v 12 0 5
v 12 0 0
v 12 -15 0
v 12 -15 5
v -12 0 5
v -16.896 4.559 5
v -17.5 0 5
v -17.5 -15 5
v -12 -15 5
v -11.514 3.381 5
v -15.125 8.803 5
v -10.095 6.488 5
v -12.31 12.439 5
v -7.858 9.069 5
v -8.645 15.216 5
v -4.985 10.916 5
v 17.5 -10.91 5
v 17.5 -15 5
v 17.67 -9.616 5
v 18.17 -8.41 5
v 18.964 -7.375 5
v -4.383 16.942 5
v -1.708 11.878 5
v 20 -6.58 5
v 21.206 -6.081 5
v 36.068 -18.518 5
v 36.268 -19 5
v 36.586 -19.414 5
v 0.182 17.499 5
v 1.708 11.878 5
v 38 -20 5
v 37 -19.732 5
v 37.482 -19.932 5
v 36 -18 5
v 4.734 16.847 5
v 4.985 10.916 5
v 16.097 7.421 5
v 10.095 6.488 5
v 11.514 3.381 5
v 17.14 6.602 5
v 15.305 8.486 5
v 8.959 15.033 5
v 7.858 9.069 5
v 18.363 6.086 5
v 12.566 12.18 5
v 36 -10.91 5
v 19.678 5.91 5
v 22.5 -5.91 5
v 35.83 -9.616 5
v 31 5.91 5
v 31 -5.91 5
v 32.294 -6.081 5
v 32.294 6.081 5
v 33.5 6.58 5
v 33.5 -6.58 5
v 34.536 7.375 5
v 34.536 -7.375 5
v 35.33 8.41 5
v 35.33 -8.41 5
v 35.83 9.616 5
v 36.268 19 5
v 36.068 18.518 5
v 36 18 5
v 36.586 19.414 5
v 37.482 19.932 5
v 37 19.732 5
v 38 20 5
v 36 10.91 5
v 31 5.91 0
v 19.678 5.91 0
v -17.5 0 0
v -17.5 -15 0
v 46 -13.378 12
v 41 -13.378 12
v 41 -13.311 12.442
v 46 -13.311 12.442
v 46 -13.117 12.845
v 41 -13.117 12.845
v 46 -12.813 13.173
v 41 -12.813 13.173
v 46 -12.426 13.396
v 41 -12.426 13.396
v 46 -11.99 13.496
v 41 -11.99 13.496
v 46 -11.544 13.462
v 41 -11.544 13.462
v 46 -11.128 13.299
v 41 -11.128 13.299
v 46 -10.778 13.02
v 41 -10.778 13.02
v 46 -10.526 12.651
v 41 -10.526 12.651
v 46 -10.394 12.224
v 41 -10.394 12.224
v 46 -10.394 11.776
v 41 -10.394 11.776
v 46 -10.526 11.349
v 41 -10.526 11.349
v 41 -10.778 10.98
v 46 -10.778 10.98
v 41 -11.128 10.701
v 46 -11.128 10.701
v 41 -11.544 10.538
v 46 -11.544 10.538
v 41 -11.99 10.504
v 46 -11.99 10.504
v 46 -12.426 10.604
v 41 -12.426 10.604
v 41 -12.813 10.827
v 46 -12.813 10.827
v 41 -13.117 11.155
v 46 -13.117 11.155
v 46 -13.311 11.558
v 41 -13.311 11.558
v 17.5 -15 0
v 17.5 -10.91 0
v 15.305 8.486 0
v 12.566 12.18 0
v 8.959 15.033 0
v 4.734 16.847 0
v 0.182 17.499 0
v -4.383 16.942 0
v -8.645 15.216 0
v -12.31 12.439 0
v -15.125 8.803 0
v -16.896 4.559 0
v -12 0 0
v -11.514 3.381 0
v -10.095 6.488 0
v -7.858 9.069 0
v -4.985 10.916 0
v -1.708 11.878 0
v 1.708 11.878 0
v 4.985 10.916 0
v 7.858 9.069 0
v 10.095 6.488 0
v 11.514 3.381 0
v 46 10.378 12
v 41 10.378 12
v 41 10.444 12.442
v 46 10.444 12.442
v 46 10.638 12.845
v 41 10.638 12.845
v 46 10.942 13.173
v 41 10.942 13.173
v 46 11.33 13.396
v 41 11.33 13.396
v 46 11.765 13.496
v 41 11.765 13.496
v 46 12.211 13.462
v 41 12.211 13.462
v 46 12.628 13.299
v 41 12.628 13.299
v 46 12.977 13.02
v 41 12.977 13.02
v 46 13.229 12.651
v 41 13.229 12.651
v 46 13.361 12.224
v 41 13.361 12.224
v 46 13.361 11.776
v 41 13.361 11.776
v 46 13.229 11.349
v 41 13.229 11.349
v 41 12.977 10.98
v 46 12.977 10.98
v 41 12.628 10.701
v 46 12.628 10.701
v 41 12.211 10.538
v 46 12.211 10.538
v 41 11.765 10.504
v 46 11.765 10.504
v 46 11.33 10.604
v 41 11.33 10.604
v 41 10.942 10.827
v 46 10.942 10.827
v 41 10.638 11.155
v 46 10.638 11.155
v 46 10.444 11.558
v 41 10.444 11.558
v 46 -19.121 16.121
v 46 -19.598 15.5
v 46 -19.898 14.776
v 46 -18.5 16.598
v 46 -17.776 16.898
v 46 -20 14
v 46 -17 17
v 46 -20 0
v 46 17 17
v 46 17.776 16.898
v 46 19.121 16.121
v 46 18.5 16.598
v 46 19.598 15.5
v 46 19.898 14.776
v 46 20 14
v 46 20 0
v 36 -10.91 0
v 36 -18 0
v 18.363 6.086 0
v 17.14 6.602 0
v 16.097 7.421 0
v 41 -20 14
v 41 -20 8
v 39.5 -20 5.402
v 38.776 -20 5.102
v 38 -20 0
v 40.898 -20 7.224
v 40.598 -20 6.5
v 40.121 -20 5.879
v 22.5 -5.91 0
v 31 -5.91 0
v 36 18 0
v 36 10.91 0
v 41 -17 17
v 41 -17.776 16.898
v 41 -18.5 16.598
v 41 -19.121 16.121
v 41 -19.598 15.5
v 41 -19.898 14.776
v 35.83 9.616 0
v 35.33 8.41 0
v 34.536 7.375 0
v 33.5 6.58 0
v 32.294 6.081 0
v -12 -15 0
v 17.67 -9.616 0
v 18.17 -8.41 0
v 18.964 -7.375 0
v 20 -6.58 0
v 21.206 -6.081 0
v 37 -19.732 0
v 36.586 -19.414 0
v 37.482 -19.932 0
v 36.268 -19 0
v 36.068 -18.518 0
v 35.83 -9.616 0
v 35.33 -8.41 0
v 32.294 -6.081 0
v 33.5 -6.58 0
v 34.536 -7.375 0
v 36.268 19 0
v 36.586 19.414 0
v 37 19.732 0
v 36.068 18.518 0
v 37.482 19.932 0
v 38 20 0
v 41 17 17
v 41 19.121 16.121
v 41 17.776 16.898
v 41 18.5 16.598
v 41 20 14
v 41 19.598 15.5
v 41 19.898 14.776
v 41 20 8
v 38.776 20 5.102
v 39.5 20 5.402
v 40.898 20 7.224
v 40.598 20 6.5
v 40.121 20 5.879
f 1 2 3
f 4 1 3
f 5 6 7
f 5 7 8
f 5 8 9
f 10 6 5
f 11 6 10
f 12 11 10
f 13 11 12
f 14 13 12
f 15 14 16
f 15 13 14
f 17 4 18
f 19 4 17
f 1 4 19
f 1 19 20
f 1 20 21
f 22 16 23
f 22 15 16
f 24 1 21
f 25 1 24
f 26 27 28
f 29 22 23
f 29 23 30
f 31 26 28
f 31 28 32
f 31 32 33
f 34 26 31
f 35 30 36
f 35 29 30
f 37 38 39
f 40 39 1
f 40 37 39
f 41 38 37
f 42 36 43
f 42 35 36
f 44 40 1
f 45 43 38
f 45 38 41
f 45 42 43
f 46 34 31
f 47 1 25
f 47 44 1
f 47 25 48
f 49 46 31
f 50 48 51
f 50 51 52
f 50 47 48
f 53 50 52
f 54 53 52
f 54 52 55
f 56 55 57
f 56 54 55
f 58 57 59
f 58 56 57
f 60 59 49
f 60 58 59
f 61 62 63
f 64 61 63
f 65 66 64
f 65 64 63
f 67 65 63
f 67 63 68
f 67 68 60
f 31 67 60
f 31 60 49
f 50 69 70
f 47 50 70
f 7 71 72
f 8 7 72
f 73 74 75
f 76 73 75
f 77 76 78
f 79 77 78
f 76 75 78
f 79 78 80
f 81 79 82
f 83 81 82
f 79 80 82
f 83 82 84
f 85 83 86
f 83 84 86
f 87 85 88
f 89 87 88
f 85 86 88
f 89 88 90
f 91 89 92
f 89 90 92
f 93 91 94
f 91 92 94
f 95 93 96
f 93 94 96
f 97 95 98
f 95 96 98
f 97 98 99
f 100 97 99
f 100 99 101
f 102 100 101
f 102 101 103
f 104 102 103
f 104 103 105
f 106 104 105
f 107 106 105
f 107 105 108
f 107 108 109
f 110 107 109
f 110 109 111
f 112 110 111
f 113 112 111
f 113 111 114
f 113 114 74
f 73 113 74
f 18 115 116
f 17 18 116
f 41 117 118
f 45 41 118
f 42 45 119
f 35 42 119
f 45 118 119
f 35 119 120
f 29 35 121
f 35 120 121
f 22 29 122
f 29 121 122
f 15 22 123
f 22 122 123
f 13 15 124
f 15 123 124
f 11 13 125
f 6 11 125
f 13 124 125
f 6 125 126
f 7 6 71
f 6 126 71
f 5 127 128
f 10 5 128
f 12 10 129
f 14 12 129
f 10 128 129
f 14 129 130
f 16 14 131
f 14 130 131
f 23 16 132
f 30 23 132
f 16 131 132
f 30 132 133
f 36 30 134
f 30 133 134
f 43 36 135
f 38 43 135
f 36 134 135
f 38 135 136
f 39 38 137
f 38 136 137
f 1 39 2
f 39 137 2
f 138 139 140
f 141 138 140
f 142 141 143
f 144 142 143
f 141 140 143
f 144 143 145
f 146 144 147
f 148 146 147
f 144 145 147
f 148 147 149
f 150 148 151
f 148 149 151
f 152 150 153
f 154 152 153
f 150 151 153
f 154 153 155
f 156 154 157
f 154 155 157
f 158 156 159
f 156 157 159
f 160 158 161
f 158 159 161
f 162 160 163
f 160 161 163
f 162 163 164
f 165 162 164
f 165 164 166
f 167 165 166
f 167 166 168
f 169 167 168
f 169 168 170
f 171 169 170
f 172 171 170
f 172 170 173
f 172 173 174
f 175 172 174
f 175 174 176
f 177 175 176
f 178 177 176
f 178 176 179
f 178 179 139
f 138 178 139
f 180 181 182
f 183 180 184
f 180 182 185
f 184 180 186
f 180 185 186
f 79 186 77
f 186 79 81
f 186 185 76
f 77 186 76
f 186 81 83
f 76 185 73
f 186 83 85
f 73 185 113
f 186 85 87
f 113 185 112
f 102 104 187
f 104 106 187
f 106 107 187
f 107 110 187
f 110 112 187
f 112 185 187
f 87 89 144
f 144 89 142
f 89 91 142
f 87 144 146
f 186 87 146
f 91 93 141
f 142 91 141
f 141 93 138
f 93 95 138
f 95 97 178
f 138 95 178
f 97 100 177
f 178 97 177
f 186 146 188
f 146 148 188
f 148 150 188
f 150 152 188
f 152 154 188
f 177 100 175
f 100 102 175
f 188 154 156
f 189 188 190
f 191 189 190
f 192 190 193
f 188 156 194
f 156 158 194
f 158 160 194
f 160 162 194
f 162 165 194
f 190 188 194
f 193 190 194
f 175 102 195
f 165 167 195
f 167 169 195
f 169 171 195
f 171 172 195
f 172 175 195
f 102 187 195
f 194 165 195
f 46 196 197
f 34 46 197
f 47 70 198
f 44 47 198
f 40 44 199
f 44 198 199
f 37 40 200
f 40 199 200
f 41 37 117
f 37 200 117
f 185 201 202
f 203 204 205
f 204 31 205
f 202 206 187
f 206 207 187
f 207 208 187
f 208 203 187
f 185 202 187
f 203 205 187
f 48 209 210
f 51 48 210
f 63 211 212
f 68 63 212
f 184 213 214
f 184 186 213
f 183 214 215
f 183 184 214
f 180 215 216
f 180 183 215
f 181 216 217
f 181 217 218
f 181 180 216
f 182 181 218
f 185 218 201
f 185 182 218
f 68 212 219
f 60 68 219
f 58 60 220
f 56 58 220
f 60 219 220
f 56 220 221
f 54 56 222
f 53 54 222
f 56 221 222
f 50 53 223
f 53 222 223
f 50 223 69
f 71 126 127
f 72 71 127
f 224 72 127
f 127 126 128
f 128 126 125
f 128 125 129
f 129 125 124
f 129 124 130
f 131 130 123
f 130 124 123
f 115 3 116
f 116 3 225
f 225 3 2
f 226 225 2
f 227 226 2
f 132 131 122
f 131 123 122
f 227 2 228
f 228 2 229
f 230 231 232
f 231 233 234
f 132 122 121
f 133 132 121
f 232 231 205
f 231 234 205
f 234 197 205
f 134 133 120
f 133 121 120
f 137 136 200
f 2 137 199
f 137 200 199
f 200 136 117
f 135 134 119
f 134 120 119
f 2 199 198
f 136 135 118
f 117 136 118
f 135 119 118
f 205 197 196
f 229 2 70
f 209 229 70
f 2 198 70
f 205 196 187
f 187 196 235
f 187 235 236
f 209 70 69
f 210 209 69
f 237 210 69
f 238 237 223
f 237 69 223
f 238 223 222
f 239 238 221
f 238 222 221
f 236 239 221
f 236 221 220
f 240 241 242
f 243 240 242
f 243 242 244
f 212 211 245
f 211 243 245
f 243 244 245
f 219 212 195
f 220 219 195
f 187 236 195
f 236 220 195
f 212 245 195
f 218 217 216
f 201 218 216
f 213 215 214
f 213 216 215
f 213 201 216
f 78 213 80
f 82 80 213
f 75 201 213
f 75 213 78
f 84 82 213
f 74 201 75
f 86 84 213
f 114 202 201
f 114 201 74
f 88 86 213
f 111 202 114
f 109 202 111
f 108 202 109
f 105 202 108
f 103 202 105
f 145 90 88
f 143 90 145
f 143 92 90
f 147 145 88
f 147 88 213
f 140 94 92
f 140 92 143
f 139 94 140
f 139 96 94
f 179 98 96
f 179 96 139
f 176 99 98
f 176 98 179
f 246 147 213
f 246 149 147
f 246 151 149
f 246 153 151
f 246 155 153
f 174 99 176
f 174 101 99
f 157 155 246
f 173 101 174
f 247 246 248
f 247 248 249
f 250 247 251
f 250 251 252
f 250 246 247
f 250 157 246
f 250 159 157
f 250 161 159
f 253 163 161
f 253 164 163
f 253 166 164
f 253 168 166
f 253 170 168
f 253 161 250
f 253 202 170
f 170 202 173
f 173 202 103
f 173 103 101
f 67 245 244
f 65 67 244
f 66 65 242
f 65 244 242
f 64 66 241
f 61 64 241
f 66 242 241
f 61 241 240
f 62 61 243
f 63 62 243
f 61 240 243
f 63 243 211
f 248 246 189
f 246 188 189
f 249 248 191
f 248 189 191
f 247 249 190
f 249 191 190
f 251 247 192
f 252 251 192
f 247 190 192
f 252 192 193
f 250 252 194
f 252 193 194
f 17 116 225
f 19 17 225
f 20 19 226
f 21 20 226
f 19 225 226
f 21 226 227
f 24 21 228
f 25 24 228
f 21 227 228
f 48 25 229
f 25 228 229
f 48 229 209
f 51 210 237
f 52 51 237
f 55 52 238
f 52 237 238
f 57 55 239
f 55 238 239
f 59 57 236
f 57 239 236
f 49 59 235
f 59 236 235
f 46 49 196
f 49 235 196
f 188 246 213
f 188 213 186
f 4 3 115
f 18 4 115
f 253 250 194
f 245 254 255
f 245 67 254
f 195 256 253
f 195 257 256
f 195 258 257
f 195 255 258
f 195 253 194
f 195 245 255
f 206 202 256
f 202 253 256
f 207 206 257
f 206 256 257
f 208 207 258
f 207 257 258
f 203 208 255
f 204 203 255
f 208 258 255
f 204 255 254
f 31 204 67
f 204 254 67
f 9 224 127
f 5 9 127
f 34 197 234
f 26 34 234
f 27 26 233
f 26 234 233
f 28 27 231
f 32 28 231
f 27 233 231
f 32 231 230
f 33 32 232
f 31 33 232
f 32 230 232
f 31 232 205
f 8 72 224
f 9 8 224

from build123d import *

# Parameters (mm, degrees)
F1_DEPTH = 5
F2_W     = 5
F2_H     = 40
F3_DEPTH = 12
F4_R     = 3
F5_R     = 1.5
F6_DEPTH = 10


with BuildPart() as f1:
    # F0 (on Top) → F1 (new body)
    with BuildSketch(Plane.XY):
        with BuildLine():
            Line((36, 18), (36, 10.910335))
            ThreePointArc((36, 10.910335), (34.535534, 7.374801), (31, 5.910335))
            Line((31, 5.910335), (19.677769, 5.910335))
            ThreePointArc((19.677769, 5.910335), (17.140309, 6.602052), (15.304931, 8.485816))
            ThreePointArc((15.304931, 8.485816), (-4.382562, 16.942348), (-17.5, 0))
            Line((-17.5, 0), (-17.5, -15))
            Line((-17.5, -15), (-12, -15))
            Line((-12, -15), (-12, 0))
            ThreePointArc((-12, 0), (0, 12), (12, 0))
            Line((12, 0), (12, -15))
            Line((12, -15), (17.5, -15))
            Line((17.5, -15), (17.5, -10.910335))
            ThreePointArc((17.5, -10.910335), (18.964466, -7.374801), (22.5, -5.910335))
            Line((22.5, -5.910335), (31, -5.910335))
            ThreePointArc((31, -5.910335), (34.535534, -7.374801), (36, -10.910335))
            Line((36, -10.910335), (36, -18))
            ThreePointArc((36, -18), (36.585786, -19.414214), (38, -20))
            Line((38, -20), (46, -20))
            Line((46, -20), (46, 0))
            Line((46, 0), (46, 20))
            Line((46, 20), (38, 20))
            ThreePointArc((38, 20), (36.585786, 19.414214), (36, 18))
        make_face()
    extrude(amount=F1_DEPTH)

    # F2 (on face) → F3 (join)
    with BuildSketch(Plane.XY.offset(5)):
        with Locations((43.5, 0)):
            Rectangle(F2_W, F2_H)
    extrude(amount=F3_DEPTH)

    # F4
    f4_edges = [f1.edges().sort_by_distance(p)[0] for p in [
        (41, 0, 5),
        (43.5, 20, 17),
        (43.5, -20, 17),
    ]]
    fillet(f4_edges, radius=F4_R)

    # F5 (on face) → F6 (cut)
    with BuildSketch(Plane(origin=(41, 0, 0), x_dir=(0, -1, 0), z_dir=(-1, 0, 0))):
        with Locations((-11.877556, 12)):
            Circle(F5_R)
        with Locations((11.877556, 12)):
            Circle(F5_R)
    extrude(amount=-F6_DEPTH, mode=Mode.SUBTRACT)


solid = f1.part
